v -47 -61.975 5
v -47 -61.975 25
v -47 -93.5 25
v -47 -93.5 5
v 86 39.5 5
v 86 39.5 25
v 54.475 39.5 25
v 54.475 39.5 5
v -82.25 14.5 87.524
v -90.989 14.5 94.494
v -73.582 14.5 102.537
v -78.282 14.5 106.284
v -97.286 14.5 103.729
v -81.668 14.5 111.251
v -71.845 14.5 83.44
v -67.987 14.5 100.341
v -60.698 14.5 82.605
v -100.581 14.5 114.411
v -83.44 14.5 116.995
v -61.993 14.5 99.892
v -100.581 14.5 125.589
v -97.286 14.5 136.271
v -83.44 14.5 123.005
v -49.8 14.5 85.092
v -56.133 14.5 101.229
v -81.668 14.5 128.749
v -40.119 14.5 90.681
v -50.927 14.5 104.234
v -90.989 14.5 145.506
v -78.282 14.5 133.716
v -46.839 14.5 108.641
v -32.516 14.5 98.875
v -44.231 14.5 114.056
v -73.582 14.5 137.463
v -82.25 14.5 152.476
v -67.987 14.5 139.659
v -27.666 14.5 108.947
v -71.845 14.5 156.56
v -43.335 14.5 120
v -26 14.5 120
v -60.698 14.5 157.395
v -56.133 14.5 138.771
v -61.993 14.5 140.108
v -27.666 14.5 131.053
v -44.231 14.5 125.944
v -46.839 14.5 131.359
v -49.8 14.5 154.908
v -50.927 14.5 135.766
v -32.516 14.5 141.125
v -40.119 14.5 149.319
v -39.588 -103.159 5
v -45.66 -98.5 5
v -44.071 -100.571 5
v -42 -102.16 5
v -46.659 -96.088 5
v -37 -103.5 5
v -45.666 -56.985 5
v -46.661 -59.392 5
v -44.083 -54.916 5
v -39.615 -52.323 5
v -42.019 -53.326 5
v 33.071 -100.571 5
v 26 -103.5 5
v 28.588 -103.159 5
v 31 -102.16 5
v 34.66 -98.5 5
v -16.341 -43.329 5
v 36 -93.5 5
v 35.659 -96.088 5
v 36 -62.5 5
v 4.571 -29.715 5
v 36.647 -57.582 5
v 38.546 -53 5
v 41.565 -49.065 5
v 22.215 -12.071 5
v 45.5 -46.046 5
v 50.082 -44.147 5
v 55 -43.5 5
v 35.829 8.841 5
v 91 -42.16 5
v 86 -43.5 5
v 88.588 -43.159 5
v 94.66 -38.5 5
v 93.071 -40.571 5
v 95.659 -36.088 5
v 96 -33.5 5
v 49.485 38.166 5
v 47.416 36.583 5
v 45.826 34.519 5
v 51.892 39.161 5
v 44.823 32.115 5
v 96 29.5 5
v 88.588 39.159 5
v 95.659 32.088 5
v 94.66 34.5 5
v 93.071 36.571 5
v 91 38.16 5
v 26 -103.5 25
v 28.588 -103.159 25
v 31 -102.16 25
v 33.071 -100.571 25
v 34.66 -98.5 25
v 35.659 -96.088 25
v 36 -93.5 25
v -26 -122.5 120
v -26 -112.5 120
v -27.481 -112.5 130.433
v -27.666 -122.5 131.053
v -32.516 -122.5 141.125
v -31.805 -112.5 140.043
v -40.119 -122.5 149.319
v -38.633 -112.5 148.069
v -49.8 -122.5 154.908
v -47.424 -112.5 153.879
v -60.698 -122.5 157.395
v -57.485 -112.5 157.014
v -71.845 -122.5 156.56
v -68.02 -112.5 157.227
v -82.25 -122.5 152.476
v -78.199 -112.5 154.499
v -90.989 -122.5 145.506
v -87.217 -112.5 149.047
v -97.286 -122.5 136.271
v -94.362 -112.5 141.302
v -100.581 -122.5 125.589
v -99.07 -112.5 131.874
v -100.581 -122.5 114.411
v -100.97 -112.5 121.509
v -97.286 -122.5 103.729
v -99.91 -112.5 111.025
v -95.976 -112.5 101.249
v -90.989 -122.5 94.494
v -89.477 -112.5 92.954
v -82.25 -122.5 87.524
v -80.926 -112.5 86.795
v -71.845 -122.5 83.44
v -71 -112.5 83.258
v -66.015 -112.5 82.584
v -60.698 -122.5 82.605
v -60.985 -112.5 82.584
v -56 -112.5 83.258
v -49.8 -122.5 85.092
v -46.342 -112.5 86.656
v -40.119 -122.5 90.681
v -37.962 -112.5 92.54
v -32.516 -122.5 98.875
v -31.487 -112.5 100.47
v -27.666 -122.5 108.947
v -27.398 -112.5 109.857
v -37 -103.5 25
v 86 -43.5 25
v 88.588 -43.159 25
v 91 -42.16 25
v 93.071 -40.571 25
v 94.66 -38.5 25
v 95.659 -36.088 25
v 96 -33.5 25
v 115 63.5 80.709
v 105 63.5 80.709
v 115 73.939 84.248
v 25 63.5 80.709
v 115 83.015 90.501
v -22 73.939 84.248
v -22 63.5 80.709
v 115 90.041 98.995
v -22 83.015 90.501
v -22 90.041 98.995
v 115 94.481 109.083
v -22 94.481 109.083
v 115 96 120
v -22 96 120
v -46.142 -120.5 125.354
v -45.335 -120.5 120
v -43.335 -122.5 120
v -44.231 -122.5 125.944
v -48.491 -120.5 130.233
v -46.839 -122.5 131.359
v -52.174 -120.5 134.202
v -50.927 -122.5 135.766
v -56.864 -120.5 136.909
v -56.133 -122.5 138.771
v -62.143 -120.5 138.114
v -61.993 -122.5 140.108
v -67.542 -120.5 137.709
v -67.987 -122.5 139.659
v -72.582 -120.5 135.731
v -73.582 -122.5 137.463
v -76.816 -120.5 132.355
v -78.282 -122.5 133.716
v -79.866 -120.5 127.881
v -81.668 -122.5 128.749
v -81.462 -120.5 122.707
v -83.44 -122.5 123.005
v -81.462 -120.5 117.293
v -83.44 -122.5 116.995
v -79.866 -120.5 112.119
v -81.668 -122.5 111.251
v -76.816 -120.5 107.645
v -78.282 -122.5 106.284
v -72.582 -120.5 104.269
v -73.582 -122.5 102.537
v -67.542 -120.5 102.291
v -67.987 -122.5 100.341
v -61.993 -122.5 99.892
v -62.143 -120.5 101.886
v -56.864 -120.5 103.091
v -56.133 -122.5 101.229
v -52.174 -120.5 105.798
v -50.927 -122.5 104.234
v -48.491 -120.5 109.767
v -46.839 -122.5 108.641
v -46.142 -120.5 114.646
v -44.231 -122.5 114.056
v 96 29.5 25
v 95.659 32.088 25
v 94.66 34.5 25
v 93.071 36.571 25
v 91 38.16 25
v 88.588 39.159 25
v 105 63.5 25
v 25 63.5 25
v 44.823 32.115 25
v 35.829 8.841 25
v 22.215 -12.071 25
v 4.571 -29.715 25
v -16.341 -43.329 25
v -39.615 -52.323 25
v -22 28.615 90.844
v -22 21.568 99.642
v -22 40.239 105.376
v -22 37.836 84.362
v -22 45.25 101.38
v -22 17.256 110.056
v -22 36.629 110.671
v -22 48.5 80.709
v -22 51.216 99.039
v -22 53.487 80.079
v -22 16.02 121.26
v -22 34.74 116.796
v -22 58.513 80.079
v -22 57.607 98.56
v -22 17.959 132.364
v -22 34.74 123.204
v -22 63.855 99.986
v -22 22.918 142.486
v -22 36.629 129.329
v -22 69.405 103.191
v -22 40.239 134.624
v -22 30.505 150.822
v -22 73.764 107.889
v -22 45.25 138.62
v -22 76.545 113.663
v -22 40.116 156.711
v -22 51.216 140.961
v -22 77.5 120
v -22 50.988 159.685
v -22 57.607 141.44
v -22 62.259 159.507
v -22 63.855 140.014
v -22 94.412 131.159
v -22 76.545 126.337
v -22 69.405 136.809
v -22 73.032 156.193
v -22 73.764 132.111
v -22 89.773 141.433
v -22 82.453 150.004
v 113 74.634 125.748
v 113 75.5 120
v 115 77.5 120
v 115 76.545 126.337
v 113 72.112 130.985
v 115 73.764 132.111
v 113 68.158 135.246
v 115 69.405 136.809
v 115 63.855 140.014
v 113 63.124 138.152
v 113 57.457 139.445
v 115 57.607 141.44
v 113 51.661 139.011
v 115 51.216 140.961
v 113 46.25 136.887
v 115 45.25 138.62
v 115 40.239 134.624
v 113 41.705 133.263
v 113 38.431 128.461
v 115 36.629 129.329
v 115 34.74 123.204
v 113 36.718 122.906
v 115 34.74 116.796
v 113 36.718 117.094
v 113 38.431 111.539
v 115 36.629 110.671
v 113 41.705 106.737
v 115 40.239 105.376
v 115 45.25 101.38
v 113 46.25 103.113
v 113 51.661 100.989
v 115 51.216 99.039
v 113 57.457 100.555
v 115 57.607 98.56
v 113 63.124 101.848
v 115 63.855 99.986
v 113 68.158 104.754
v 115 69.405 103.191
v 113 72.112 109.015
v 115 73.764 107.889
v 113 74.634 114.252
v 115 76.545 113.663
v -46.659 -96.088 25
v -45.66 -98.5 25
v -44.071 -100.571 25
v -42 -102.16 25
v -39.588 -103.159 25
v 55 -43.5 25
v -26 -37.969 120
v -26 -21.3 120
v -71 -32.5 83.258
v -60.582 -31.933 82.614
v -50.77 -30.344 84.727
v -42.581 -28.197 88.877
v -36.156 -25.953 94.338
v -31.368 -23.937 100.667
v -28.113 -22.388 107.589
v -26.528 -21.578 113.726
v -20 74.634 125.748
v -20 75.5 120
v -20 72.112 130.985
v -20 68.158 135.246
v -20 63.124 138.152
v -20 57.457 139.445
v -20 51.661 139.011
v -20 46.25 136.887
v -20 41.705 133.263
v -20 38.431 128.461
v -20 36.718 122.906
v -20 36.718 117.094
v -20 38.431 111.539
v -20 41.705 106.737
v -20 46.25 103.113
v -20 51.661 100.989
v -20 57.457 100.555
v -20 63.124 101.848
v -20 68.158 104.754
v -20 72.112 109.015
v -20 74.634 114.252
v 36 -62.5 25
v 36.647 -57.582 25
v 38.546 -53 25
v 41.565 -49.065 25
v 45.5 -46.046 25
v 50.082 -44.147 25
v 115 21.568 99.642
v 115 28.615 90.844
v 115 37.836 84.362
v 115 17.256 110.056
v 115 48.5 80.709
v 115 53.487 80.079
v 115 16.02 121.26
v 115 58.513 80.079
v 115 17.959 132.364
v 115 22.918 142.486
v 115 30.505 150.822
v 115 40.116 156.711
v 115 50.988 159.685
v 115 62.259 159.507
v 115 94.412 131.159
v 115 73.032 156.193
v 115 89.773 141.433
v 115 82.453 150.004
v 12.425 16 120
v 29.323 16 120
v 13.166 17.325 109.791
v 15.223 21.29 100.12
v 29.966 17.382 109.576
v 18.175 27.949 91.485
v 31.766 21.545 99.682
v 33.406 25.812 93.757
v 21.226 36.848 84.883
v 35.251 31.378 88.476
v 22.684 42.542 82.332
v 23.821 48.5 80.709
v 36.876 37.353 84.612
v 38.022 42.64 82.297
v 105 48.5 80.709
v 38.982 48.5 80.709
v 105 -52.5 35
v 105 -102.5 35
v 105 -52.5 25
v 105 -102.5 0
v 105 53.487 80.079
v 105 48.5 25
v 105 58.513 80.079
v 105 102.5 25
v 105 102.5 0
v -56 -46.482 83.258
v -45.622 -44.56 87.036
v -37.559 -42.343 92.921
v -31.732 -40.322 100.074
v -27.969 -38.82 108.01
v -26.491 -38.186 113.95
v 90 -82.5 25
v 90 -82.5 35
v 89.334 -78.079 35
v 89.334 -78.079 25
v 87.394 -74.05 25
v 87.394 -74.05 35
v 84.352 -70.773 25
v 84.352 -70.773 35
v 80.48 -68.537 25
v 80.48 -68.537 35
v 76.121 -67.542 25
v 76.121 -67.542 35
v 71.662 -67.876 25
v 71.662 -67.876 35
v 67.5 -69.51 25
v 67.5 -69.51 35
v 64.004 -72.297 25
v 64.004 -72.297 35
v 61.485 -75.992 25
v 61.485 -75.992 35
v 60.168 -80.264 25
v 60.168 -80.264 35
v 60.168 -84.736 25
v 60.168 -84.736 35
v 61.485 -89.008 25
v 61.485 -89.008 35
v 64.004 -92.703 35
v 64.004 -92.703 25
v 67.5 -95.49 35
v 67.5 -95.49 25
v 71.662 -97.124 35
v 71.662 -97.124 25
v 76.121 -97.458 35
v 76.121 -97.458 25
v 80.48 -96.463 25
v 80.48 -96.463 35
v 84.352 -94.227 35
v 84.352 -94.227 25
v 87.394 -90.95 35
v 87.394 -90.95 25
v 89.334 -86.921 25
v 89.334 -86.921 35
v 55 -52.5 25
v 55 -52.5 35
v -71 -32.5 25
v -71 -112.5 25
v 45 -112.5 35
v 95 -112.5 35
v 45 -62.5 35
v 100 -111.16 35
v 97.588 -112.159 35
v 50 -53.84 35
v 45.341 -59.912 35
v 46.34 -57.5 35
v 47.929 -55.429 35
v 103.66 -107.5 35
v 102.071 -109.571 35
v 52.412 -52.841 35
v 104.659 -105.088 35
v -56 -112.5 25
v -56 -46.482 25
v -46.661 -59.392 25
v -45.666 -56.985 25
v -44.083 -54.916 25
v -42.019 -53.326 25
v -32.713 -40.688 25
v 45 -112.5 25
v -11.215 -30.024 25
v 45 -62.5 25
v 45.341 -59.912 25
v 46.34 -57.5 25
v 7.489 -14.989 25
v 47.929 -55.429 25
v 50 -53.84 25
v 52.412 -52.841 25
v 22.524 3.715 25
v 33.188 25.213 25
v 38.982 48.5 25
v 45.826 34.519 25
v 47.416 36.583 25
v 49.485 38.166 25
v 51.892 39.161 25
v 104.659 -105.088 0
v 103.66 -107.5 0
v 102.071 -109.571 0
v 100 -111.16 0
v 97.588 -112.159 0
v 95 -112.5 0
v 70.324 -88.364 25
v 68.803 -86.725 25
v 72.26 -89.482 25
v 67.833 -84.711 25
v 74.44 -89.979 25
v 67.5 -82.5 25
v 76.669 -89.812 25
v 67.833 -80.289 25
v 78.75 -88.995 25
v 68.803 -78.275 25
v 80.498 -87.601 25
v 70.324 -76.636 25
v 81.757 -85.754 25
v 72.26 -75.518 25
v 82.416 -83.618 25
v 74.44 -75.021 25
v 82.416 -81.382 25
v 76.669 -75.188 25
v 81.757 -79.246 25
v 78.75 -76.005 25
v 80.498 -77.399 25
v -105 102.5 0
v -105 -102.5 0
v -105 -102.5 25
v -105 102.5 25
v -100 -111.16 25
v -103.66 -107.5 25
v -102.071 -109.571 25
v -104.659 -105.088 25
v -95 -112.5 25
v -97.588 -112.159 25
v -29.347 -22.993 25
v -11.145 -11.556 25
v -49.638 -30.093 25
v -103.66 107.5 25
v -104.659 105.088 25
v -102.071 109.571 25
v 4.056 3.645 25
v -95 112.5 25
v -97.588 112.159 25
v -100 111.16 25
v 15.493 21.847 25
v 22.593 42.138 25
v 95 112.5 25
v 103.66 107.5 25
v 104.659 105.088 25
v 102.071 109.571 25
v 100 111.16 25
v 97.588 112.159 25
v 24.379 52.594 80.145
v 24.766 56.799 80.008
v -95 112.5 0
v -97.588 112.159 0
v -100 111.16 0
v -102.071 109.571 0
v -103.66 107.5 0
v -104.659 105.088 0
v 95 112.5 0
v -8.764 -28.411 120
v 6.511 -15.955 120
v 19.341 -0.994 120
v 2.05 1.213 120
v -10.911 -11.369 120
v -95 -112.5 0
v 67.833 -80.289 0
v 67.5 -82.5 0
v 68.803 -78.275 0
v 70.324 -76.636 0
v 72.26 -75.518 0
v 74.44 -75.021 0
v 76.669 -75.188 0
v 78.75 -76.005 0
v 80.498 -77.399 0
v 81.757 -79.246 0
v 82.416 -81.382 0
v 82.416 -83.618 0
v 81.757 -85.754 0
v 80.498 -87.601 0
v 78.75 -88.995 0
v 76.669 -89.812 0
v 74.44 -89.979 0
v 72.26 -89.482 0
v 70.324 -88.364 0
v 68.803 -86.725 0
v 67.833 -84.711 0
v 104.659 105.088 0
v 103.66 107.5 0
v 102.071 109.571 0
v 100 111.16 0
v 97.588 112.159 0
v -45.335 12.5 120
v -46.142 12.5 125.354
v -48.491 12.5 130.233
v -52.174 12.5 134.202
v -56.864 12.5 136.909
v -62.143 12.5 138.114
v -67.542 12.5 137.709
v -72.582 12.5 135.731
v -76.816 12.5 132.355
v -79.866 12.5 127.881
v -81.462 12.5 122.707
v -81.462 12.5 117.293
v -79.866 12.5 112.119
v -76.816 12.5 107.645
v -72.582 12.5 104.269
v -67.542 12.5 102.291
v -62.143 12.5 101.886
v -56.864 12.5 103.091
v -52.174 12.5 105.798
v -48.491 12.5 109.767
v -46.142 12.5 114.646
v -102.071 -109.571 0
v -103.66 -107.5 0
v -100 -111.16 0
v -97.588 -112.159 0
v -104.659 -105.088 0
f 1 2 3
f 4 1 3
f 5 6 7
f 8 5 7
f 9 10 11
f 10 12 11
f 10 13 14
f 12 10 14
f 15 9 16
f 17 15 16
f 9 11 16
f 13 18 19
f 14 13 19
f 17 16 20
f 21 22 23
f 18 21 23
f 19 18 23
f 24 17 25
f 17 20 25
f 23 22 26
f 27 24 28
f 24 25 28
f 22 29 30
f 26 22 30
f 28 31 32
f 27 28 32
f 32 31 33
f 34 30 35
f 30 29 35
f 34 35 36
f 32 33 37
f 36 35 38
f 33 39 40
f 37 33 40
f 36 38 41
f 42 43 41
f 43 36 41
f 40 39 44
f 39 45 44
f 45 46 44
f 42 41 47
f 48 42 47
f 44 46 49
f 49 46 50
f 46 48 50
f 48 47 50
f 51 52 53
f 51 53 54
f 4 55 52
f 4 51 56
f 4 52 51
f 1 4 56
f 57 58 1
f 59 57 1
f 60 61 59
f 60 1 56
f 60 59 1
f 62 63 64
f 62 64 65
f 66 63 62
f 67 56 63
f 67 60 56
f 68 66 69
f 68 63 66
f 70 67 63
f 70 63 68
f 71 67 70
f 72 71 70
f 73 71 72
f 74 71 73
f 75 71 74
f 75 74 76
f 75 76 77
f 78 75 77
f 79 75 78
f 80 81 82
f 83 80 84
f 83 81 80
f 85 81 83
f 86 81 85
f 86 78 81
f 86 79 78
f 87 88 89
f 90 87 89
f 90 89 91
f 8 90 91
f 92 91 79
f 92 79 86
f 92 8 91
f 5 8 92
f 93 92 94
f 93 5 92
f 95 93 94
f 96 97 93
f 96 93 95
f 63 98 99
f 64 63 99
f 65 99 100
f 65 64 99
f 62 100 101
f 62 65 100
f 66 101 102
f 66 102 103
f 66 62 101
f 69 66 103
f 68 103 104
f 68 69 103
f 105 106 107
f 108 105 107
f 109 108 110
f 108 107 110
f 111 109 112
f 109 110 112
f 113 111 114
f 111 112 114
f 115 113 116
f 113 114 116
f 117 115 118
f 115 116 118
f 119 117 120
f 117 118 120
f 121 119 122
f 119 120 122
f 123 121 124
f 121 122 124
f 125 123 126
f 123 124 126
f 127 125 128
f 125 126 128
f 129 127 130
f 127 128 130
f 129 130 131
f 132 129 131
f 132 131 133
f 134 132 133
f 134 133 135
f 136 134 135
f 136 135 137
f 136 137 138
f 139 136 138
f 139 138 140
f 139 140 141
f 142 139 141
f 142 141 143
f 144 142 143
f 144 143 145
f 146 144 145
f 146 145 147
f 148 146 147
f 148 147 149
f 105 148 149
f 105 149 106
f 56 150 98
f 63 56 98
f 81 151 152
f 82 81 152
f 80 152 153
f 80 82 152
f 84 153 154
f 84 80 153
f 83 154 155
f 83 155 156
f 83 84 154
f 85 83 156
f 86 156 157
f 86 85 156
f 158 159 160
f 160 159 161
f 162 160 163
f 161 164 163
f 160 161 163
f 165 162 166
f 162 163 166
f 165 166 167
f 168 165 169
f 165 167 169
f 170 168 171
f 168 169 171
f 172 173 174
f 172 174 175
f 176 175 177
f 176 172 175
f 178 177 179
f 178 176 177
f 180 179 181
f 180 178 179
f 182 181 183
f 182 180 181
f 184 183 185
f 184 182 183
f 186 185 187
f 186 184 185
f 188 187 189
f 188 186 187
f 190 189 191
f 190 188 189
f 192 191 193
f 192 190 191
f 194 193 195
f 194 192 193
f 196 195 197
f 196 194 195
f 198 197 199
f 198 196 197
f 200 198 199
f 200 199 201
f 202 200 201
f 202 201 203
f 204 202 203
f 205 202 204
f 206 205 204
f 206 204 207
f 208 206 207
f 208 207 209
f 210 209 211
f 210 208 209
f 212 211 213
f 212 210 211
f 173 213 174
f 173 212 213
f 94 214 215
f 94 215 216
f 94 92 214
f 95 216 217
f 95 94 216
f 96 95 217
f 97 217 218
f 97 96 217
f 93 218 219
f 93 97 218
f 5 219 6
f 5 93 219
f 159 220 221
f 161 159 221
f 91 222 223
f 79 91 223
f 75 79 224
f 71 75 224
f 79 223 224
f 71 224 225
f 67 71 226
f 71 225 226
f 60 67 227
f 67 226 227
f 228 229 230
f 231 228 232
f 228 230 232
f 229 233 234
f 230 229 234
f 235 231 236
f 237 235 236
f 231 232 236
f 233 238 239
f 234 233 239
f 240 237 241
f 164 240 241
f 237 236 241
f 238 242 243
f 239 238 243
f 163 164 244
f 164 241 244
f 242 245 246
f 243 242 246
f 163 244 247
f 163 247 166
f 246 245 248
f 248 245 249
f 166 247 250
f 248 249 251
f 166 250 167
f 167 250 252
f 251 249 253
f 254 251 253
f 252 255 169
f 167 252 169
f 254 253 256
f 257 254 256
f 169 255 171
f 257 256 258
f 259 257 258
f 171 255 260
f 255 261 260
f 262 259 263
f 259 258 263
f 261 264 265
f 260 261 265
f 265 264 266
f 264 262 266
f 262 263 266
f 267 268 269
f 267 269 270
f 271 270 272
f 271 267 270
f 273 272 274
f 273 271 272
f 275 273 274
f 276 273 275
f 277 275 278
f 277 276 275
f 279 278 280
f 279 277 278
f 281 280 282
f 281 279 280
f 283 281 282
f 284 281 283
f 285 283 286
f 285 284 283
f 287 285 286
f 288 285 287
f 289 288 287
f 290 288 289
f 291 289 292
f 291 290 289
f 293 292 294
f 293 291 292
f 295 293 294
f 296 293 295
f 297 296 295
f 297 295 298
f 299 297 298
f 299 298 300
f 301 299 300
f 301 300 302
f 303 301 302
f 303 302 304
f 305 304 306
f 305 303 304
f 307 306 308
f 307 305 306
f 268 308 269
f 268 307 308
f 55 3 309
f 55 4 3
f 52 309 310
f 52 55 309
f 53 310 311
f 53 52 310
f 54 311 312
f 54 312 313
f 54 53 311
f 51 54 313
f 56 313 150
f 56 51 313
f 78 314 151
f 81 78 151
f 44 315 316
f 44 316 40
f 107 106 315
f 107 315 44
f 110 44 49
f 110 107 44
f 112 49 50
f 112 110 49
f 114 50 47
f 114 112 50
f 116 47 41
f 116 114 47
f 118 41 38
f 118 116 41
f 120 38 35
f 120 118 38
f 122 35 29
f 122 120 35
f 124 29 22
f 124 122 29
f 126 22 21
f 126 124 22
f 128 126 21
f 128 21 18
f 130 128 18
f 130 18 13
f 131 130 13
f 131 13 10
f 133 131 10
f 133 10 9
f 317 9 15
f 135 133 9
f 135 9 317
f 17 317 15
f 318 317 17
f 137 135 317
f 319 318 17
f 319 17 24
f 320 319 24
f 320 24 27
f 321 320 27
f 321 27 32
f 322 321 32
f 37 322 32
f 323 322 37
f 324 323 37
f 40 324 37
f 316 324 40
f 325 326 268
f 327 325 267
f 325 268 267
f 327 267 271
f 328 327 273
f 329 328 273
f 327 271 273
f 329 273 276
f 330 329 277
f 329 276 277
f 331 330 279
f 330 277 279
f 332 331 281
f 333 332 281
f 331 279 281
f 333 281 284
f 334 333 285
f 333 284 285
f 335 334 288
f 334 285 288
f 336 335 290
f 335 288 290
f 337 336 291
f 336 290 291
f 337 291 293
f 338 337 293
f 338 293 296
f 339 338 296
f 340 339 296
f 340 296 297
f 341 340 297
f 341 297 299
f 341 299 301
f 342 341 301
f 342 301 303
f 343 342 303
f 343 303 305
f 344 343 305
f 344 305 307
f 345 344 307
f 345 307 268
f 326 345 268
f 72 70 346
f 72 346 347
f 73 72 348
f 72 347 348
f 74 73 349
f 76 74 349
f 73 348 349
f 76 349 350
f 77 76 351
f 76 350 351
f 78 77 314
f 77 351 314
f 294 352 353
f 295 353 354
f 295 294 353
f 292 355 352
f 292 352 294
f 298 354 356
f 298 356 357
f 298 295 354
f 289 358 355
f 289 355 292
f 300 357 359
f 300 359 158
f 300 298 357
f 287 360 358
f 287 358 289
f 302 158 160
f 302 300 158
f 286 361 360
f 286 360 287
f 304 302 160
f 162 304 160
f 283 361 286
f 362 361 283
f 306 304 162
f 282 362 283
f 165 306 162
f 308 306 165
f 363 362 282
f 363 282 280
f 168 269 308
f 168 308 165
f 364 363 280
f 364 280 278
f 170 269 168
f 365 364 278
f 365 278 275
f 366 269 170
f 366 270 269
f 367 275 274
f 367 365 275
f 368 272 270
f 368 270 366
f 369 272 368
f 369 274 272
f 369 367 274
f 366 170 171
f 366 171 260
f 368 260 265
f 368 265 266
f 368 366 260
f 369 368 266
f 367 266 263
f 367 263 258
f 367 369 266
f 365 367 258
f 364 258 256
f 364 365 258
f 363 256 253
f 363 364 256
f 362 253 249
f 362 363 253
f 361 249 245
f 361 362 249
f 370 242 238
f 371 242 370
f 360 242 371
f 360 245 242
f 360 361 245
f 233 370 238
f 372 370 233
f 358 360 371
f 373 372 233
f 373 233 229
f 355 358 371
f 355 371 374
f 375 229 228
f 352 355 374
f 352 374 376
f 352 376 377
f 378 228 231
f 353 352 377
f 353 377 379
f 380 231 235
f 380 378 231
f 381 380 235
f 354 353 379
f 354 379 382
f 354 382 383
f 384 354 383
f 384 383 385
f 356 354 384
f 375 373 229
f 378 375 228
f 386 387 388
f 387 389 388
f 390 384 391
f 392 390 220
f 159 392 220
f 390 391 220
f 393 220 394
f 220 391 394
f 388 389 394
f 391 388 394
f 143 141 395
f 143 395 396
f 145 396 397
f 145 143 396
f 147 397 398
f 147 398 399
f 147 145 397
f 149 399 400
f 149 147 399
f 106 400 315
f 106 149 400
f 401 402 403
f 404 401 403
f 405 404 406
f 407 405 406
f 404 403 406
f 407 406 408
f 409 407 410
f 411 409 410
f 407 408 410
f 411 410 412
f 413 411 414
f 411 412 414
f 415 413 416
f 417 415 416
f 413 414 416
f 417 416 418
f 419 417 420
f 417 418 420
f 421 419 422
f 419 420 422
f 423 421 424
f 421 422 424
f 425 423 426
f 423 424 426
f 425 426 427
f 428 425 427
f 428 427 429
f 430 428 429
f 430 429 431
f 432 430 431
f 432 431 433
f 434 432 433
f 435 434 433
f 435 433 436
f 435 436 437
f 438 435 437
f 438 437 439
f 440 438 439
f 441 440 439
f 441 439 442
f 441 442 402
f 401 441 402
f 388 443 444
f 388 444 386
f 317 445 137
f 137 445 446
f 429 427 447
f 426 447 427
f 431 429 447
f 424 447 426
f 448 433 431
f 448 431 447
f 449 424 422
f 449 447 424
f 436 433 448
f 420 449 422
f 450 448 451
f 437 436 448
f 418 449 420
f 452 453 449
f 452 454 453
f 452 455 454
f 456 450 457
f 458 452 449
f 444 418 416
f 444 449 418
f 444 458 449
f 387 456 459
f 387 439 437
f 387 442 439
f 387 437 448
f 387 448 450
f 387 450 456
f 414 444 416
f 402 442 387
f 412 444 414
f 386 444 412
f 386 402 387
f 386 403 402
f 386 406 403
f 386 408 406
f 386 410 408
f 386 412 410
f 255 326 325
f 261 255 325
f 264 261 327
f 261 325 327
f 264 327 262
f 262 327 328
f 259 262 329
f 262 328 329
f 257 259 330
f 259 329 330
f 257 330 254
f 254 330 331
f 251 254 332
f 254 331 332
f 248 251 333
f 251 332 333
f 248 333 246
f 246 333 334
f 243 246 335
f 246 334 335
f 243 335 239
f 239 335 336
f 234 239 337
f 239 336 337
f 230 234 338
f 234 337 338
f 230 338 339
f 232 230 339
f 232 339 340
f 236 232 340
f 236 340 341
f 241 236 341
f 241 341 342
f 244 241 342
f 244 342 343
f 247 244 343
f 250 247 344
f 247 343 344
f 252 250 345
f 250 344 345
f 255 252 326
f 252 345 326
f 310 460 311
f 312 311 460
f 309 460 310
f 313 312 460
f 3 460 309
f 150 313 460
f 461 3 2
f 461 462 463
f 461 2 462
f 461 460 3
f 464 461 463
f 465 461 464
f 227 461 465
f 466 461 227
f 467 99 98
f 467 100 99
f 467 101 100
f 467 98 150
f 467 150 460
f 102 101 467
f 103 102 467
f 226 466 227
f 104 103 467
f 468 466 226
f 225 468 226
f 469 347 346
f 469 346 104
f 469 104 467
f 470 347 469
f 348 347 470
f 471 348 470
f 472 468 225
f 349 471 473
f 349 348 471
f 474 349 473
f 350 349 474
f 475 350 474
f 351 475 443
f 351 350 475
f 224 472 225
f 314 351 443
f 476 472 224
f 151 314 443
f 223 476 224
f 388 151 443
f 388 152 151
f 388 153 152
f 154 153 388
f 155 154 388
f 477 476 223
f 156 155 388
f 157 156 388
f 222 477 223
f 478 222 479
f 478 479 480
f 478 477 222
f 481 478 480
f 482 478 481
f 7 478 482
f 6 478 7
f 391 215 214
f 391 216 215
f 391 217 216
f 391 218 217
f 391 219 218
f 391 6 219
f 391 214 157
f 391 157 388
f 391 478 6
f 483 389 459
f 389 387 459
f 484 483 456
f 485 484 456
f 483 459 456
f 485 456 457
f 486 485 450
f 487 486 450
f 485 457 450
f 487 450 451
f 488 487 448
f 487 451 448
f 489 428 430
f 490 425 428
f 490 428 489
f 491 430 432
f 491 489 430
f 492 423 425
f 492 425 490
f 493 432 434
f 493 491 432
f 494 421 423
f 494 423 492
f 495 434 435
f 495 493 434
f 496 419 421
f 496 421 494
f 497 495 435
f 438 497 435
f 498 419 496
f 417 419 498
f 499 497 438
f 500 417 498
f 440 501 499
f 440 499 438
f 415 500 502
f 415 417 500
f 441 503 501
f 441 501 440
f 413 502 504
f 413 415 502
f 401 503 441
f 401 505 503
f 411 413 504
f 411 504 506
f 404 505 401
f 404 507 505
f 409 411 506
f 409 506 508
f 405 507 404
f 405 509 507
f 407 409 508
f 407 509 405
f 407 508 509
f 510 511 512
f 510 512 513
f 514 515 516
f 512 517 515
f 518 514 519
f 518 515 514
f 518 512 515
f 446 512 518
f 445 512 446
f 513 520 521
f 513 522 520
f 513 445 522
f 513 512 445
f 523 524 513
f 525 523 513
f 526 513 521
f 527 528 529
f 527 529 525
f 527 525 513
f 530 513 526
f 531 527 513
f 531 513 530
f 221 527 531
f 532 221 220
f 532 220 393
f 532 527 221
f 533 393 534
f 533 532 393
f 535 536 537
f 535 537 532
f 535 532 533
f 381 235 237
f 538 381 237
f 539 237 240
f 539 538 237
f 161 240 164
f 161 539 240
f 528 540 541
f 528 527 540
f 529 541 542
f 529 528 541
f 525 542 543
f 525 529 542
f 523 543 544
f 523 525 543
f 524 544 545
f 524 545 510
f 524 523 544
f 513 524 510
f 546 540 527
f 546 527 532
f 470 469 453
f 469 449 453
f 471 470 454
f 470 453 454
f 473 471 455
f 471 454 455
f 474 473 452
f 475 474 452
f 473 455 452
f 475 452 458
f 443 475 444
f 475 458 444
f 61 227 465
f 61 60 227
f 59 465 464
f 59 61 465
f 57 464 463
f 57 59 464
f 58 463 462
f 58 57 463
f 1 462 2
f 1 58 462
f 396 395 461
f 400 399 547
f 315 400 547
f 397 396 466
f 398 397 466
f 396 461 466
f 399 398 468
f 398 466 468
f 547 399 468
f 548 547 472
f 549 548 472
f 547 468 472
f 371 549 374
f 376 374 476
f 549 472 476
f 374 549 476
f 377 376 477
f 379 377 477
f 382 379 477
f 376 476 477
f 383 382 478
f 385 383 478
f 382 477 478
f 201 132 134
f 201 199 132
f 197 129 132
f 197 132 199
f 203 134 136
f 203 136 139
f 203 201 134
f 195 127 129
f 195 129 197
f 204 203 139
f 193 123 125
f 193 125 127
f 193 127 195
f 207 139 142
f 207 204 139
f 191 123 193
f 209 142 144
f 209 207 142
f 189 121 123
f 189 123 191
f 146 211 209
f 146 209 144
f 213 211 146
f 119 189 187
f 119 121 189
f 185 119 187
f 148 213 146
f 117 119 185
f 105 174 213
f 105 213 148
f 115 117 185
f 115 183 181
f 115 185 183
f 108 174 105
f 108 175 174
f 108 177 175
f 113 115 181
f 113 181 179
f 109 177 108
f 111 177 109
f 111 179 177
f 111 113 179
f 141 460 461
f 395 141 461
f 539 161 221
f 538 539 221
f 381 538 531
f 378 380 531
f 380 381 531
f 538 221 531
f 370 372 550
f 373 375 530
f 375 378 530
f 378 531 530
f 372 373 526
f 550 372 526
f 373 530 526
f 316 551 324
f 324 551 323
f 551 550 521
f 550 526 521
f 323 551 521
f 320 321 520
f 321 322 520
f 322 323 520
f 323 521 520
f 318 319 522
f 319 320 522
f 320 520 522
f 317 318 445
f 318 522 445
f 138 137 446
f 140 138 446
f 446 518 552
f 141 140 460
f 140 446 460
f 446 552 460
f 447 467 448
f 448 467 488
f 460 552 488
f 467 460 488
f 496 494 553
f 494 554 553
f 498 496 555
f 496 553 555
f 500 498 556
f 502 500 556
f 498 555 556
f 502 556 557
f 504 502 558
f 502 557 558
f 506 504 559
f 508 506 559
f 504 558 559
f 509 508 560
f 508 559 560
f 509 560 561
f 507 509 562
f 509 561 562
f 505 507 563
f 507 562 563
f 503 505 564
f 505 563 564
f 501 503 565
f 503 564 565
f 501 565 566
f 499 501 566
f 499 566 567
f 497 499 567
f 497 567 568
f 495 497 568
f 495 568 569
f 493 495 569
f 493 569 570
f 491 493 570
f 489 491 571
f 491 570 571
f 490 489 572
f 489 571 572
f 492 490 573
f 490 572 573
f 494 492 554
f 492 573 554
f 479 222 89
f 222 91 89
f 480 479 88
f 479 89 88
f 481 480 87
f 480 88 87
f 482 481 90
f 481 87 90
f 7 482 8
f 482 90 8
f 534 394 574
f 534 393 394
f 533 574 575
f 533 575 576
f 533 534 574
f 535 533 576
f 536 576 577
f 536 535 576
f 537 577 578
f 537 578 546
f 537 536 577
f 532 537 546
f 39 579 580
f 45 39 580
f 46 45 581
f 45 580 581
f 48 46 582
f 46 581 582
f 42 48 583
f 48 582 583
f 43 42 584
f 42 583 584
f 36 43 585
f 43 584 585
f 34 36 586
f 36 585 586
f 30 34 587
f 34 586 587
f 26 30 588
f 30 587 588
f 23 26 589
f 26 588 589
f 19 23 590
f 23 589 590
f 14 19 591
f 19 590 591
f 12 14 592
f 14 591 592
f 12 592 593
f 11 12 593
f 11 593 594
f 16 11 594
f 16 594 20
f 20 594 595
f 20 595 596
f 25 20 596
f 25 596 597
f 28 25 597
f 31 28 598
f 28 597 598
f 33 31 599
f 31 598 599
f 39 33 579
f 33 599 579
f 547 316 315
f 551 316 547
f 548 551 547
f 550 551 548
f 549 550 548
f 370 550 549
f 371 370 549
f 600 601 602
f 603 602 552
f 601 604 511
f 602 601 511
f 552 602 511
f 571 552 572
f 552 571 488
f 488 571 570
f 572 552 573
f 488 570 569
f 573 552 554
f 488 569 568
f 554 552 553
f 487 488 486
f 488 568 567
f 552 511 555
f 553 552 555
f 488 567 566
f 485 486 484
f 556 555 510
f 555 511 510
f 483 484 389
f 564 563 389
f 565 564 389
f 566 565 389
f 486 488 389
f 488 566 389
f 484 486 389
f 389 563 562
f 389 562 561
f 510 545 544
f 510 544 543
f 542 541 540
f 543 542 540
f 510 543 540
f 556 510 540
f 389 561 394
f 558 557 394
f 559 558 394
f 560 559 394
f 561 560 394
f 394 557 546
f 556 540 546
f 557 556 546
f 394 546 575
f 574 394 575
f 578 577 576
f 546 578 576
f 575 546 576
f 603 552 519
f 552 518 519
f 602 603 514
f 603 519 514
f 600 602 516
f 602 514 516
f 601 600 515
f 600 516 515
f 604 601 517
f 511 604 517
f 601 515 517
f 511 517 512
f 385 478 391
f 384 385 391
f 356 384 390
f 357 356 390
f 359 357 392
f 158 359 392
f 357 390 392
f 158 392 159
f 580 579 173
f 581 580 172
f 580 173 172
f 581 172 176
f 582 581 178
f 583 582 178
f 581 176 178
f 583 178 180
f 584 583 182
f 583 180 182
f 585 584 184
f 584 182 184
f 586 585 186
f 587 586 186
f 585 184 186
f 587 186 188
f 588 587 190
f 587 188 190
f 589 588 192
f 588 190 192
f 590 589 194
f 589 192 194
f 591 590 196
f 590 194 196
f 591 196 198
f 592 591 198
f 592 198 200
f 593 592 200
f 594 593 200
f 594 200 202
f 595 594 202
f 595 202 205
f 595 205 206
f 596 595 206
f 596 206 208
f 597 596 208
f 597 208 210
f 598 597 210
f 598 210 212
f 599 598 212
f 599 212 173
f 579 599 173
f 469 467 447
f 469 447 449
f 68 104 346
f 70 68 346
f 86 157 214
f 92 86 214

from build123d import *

# Parameters (mm, degrees)
F0_W            = 210
F0_H            = 225
F1_DEPTH        = 25
F3_DEPTH        = 95
F4_R            = 37.5
F5_DEPTH        = 10
F5_DEPTH_BACK   = 127
F7_DEPTH        = 10
F7_DEPTH_BACK   = 127
F8_W            = 60
F8_H            = 60
F9_DEPTH        = 10
F10_R           = 10
F12_DEPTH       = 20
F14_D           = 15
F14_CBORE_D     = 30
F14_CBORE_DEPTH = 10
F15_R           = 10
F16_R           = 18.1648840972
F17_DEPTH       = 235.001
F18_R           = 19.5
F19_DEPTH       = 220.001
F20_SIZE        = 2
F21_R           = 10


with BuildPart() as f1:
    # F0 (on Top) → F1 (new body)
    with BuildSketch(Plane.XY):
        Rectangle(F0_W, F0_H)
    extrude(amount=F1_DEPTH)

    # F2 (on face) → F3 (join)
    with BuildSketch(Plane.XY.offset(25)):
        with BuildLine():
            Line((-71, -32.5), (-71, -112.5))
            Line((-71, -112.5), (-56, -112.5))
            Line((-56, -112.5), (-56, -46.4818166789))
            ThreePointArc((-56, -46.4818166789), (7.4888527117, -14.9888527117), (38.9818166789, 48.5))
            Line((38.9818166789, 48.5), (105, 48.5))
            Line((105, 48.5), (105, 63.5))
            Line((105, 63.5), (25, 63.5))
            ThreePointArc((25, 63.5), (-3.1177490061, -4.3822509939), (-71, -32.5))
        make_face()
    extrude(amount=F3_DEPTH)

    # F4 (on face) → F5 (join, two sides)
    with BuildSketch(Plane.XZ.offset(112.5)) as f5_sk:
        with Locations((-63.5, 120)):
            Circle(F4_R)
    extrude(amount=F5_DEPTH)
    extrude(f5_sk.sketch, amount=-F5_DEPTH_BACK)

    # F6 (on face) → F7 (join, two sides)
    with BuildSketch(Plane.YZ.offset(105)) as f7_sk:
        with BuildLine():
            ThreePointArc((63.5, 80.7094158862), (86.8220700148, 94.504902432), (96, 120))
            ThreePointArc((96, 120), (30.504902432, 150.8220700148), (48.5, 80.7094158862))
            Line((48.5, 80.7094158862), (48.5, 120))
            Line((48.5, 120), (63.5, 120))
            Line((63.5, 120), (63.5, 80.7094158862))
        make_face()
        with BuildLine():
            Line((48.5, 120), (48.5, 80.7094158862))
            ThreePointArc((48.5, 80.7094158862), (56, 80), (63.5, 80.7094158862))
            Line((63.5, 80.7094158862), (63.5, 120))
            Line((63.5, 120), (48.5, 120))
        make_face()
    extrude(amount=F7_DEPTH)
    extrude(f7_sk.sketch, amount=-F7_DEPTH_BACK)

    # F8 (on face) → F9 (join)
    with BuildSketch(Plane.XY.offset(25)):
        with Locations((75, -82.5)):
            Rectangle(F8_W, F8_H)
    extrude(amount=F9_DEPTH)

    # F10
    f10_edges = [f1.edges().sort_by_distance(p)[0] for p in [
        (45, -52.5, 30),
    ]]
    fillet(f10_edges, radius=F10_R)

    # F11 (on face) → F12 (cut)
    with BuildSketch(Plane.XY.offset(25)):
        with BuildLine():
            ThreePointArc((46.5755076536, 39.5), (13.8528137424, -21.3528137424), (-47, -54.0755076536))
            Line((-47, -54.0755076536), (-47, -103.5))
            Line((-47, -103.5), (36, -103.5))
            Line((36, -103.5), (36, -62.5))
            ThreePointArc((36, -62.5), (41.5649711575, -49.0649711575), (55, -43.5))
            Line((55, -43.5), (96, -43.5))
            Line((96, -43.5), (96, 39.5))
            Line((96, 39.5), (46.5755076536, 39.5))
        make_face()
    extrude(amount=-F12_DEPTH, mode=Mode.SUBTRACT)

    # F14 (through all)
    with Locations(Plane.XY.offset(35)):
        with Locations((75, -82.5)):
            CounterBoreHole(F14_D / 2, F14_CBORE_D / 2, F14_CBORE_DEPTH)

    # F15
    f15_edges = [f1.edges().sort_by_distance(p)[0] for p in [
        (-47, -54.075508, 15),
        (-47, -103.5, 15),
        (46.575508, 39.5, 15),
        (96, 39.5, 15),
        (96, -43.5, 15),
        (36, -103.5, 15),
    ]]
    fillet(f15_edges, radius=F15_R)

    # F16 (on face) → F17 (cut, through all)
    with BuildSketch(Plane.XZ.offset(122.5)):
        with Locations((-63.5, 120)):
            Circle(F16_R)
    extrude(amount=-F17_DEPTH, mode=Mode.SUBTRACT)

    # F18 (on face) → F19 (cut, through all)
    with BuildSketch(Plane.YZ.offset(115)):
        with Locations((56, 120)):
            Circle(F18_R)
    extrude(amount=-F19_DEPTH, mode=Mode.SUBTRACT)

    # F20
    f20_edges = [f1.edges().sort_by_distance(p)[0] for p in [
        (-81.664884, -122.5, 120),
        (115, 36.5, 120),
        (-81.664884, 14.5, 120),
        (-22, 36.5, 120),
    ]]
    chamfer(f20_edges, length=F20_SIZE)

    # F21
    f21_edges = [f1.edges().sort_by_distance(p)[0] for p in [
        (105, -112.5, 17.5),
        (105, 112.5, 12.5),
        (-105, 112.5, 12.5),
        (-105, -112.5, 12.5),
    ]]
    fillet(f21_edges, radius=F21_R)


solid = f1.part
